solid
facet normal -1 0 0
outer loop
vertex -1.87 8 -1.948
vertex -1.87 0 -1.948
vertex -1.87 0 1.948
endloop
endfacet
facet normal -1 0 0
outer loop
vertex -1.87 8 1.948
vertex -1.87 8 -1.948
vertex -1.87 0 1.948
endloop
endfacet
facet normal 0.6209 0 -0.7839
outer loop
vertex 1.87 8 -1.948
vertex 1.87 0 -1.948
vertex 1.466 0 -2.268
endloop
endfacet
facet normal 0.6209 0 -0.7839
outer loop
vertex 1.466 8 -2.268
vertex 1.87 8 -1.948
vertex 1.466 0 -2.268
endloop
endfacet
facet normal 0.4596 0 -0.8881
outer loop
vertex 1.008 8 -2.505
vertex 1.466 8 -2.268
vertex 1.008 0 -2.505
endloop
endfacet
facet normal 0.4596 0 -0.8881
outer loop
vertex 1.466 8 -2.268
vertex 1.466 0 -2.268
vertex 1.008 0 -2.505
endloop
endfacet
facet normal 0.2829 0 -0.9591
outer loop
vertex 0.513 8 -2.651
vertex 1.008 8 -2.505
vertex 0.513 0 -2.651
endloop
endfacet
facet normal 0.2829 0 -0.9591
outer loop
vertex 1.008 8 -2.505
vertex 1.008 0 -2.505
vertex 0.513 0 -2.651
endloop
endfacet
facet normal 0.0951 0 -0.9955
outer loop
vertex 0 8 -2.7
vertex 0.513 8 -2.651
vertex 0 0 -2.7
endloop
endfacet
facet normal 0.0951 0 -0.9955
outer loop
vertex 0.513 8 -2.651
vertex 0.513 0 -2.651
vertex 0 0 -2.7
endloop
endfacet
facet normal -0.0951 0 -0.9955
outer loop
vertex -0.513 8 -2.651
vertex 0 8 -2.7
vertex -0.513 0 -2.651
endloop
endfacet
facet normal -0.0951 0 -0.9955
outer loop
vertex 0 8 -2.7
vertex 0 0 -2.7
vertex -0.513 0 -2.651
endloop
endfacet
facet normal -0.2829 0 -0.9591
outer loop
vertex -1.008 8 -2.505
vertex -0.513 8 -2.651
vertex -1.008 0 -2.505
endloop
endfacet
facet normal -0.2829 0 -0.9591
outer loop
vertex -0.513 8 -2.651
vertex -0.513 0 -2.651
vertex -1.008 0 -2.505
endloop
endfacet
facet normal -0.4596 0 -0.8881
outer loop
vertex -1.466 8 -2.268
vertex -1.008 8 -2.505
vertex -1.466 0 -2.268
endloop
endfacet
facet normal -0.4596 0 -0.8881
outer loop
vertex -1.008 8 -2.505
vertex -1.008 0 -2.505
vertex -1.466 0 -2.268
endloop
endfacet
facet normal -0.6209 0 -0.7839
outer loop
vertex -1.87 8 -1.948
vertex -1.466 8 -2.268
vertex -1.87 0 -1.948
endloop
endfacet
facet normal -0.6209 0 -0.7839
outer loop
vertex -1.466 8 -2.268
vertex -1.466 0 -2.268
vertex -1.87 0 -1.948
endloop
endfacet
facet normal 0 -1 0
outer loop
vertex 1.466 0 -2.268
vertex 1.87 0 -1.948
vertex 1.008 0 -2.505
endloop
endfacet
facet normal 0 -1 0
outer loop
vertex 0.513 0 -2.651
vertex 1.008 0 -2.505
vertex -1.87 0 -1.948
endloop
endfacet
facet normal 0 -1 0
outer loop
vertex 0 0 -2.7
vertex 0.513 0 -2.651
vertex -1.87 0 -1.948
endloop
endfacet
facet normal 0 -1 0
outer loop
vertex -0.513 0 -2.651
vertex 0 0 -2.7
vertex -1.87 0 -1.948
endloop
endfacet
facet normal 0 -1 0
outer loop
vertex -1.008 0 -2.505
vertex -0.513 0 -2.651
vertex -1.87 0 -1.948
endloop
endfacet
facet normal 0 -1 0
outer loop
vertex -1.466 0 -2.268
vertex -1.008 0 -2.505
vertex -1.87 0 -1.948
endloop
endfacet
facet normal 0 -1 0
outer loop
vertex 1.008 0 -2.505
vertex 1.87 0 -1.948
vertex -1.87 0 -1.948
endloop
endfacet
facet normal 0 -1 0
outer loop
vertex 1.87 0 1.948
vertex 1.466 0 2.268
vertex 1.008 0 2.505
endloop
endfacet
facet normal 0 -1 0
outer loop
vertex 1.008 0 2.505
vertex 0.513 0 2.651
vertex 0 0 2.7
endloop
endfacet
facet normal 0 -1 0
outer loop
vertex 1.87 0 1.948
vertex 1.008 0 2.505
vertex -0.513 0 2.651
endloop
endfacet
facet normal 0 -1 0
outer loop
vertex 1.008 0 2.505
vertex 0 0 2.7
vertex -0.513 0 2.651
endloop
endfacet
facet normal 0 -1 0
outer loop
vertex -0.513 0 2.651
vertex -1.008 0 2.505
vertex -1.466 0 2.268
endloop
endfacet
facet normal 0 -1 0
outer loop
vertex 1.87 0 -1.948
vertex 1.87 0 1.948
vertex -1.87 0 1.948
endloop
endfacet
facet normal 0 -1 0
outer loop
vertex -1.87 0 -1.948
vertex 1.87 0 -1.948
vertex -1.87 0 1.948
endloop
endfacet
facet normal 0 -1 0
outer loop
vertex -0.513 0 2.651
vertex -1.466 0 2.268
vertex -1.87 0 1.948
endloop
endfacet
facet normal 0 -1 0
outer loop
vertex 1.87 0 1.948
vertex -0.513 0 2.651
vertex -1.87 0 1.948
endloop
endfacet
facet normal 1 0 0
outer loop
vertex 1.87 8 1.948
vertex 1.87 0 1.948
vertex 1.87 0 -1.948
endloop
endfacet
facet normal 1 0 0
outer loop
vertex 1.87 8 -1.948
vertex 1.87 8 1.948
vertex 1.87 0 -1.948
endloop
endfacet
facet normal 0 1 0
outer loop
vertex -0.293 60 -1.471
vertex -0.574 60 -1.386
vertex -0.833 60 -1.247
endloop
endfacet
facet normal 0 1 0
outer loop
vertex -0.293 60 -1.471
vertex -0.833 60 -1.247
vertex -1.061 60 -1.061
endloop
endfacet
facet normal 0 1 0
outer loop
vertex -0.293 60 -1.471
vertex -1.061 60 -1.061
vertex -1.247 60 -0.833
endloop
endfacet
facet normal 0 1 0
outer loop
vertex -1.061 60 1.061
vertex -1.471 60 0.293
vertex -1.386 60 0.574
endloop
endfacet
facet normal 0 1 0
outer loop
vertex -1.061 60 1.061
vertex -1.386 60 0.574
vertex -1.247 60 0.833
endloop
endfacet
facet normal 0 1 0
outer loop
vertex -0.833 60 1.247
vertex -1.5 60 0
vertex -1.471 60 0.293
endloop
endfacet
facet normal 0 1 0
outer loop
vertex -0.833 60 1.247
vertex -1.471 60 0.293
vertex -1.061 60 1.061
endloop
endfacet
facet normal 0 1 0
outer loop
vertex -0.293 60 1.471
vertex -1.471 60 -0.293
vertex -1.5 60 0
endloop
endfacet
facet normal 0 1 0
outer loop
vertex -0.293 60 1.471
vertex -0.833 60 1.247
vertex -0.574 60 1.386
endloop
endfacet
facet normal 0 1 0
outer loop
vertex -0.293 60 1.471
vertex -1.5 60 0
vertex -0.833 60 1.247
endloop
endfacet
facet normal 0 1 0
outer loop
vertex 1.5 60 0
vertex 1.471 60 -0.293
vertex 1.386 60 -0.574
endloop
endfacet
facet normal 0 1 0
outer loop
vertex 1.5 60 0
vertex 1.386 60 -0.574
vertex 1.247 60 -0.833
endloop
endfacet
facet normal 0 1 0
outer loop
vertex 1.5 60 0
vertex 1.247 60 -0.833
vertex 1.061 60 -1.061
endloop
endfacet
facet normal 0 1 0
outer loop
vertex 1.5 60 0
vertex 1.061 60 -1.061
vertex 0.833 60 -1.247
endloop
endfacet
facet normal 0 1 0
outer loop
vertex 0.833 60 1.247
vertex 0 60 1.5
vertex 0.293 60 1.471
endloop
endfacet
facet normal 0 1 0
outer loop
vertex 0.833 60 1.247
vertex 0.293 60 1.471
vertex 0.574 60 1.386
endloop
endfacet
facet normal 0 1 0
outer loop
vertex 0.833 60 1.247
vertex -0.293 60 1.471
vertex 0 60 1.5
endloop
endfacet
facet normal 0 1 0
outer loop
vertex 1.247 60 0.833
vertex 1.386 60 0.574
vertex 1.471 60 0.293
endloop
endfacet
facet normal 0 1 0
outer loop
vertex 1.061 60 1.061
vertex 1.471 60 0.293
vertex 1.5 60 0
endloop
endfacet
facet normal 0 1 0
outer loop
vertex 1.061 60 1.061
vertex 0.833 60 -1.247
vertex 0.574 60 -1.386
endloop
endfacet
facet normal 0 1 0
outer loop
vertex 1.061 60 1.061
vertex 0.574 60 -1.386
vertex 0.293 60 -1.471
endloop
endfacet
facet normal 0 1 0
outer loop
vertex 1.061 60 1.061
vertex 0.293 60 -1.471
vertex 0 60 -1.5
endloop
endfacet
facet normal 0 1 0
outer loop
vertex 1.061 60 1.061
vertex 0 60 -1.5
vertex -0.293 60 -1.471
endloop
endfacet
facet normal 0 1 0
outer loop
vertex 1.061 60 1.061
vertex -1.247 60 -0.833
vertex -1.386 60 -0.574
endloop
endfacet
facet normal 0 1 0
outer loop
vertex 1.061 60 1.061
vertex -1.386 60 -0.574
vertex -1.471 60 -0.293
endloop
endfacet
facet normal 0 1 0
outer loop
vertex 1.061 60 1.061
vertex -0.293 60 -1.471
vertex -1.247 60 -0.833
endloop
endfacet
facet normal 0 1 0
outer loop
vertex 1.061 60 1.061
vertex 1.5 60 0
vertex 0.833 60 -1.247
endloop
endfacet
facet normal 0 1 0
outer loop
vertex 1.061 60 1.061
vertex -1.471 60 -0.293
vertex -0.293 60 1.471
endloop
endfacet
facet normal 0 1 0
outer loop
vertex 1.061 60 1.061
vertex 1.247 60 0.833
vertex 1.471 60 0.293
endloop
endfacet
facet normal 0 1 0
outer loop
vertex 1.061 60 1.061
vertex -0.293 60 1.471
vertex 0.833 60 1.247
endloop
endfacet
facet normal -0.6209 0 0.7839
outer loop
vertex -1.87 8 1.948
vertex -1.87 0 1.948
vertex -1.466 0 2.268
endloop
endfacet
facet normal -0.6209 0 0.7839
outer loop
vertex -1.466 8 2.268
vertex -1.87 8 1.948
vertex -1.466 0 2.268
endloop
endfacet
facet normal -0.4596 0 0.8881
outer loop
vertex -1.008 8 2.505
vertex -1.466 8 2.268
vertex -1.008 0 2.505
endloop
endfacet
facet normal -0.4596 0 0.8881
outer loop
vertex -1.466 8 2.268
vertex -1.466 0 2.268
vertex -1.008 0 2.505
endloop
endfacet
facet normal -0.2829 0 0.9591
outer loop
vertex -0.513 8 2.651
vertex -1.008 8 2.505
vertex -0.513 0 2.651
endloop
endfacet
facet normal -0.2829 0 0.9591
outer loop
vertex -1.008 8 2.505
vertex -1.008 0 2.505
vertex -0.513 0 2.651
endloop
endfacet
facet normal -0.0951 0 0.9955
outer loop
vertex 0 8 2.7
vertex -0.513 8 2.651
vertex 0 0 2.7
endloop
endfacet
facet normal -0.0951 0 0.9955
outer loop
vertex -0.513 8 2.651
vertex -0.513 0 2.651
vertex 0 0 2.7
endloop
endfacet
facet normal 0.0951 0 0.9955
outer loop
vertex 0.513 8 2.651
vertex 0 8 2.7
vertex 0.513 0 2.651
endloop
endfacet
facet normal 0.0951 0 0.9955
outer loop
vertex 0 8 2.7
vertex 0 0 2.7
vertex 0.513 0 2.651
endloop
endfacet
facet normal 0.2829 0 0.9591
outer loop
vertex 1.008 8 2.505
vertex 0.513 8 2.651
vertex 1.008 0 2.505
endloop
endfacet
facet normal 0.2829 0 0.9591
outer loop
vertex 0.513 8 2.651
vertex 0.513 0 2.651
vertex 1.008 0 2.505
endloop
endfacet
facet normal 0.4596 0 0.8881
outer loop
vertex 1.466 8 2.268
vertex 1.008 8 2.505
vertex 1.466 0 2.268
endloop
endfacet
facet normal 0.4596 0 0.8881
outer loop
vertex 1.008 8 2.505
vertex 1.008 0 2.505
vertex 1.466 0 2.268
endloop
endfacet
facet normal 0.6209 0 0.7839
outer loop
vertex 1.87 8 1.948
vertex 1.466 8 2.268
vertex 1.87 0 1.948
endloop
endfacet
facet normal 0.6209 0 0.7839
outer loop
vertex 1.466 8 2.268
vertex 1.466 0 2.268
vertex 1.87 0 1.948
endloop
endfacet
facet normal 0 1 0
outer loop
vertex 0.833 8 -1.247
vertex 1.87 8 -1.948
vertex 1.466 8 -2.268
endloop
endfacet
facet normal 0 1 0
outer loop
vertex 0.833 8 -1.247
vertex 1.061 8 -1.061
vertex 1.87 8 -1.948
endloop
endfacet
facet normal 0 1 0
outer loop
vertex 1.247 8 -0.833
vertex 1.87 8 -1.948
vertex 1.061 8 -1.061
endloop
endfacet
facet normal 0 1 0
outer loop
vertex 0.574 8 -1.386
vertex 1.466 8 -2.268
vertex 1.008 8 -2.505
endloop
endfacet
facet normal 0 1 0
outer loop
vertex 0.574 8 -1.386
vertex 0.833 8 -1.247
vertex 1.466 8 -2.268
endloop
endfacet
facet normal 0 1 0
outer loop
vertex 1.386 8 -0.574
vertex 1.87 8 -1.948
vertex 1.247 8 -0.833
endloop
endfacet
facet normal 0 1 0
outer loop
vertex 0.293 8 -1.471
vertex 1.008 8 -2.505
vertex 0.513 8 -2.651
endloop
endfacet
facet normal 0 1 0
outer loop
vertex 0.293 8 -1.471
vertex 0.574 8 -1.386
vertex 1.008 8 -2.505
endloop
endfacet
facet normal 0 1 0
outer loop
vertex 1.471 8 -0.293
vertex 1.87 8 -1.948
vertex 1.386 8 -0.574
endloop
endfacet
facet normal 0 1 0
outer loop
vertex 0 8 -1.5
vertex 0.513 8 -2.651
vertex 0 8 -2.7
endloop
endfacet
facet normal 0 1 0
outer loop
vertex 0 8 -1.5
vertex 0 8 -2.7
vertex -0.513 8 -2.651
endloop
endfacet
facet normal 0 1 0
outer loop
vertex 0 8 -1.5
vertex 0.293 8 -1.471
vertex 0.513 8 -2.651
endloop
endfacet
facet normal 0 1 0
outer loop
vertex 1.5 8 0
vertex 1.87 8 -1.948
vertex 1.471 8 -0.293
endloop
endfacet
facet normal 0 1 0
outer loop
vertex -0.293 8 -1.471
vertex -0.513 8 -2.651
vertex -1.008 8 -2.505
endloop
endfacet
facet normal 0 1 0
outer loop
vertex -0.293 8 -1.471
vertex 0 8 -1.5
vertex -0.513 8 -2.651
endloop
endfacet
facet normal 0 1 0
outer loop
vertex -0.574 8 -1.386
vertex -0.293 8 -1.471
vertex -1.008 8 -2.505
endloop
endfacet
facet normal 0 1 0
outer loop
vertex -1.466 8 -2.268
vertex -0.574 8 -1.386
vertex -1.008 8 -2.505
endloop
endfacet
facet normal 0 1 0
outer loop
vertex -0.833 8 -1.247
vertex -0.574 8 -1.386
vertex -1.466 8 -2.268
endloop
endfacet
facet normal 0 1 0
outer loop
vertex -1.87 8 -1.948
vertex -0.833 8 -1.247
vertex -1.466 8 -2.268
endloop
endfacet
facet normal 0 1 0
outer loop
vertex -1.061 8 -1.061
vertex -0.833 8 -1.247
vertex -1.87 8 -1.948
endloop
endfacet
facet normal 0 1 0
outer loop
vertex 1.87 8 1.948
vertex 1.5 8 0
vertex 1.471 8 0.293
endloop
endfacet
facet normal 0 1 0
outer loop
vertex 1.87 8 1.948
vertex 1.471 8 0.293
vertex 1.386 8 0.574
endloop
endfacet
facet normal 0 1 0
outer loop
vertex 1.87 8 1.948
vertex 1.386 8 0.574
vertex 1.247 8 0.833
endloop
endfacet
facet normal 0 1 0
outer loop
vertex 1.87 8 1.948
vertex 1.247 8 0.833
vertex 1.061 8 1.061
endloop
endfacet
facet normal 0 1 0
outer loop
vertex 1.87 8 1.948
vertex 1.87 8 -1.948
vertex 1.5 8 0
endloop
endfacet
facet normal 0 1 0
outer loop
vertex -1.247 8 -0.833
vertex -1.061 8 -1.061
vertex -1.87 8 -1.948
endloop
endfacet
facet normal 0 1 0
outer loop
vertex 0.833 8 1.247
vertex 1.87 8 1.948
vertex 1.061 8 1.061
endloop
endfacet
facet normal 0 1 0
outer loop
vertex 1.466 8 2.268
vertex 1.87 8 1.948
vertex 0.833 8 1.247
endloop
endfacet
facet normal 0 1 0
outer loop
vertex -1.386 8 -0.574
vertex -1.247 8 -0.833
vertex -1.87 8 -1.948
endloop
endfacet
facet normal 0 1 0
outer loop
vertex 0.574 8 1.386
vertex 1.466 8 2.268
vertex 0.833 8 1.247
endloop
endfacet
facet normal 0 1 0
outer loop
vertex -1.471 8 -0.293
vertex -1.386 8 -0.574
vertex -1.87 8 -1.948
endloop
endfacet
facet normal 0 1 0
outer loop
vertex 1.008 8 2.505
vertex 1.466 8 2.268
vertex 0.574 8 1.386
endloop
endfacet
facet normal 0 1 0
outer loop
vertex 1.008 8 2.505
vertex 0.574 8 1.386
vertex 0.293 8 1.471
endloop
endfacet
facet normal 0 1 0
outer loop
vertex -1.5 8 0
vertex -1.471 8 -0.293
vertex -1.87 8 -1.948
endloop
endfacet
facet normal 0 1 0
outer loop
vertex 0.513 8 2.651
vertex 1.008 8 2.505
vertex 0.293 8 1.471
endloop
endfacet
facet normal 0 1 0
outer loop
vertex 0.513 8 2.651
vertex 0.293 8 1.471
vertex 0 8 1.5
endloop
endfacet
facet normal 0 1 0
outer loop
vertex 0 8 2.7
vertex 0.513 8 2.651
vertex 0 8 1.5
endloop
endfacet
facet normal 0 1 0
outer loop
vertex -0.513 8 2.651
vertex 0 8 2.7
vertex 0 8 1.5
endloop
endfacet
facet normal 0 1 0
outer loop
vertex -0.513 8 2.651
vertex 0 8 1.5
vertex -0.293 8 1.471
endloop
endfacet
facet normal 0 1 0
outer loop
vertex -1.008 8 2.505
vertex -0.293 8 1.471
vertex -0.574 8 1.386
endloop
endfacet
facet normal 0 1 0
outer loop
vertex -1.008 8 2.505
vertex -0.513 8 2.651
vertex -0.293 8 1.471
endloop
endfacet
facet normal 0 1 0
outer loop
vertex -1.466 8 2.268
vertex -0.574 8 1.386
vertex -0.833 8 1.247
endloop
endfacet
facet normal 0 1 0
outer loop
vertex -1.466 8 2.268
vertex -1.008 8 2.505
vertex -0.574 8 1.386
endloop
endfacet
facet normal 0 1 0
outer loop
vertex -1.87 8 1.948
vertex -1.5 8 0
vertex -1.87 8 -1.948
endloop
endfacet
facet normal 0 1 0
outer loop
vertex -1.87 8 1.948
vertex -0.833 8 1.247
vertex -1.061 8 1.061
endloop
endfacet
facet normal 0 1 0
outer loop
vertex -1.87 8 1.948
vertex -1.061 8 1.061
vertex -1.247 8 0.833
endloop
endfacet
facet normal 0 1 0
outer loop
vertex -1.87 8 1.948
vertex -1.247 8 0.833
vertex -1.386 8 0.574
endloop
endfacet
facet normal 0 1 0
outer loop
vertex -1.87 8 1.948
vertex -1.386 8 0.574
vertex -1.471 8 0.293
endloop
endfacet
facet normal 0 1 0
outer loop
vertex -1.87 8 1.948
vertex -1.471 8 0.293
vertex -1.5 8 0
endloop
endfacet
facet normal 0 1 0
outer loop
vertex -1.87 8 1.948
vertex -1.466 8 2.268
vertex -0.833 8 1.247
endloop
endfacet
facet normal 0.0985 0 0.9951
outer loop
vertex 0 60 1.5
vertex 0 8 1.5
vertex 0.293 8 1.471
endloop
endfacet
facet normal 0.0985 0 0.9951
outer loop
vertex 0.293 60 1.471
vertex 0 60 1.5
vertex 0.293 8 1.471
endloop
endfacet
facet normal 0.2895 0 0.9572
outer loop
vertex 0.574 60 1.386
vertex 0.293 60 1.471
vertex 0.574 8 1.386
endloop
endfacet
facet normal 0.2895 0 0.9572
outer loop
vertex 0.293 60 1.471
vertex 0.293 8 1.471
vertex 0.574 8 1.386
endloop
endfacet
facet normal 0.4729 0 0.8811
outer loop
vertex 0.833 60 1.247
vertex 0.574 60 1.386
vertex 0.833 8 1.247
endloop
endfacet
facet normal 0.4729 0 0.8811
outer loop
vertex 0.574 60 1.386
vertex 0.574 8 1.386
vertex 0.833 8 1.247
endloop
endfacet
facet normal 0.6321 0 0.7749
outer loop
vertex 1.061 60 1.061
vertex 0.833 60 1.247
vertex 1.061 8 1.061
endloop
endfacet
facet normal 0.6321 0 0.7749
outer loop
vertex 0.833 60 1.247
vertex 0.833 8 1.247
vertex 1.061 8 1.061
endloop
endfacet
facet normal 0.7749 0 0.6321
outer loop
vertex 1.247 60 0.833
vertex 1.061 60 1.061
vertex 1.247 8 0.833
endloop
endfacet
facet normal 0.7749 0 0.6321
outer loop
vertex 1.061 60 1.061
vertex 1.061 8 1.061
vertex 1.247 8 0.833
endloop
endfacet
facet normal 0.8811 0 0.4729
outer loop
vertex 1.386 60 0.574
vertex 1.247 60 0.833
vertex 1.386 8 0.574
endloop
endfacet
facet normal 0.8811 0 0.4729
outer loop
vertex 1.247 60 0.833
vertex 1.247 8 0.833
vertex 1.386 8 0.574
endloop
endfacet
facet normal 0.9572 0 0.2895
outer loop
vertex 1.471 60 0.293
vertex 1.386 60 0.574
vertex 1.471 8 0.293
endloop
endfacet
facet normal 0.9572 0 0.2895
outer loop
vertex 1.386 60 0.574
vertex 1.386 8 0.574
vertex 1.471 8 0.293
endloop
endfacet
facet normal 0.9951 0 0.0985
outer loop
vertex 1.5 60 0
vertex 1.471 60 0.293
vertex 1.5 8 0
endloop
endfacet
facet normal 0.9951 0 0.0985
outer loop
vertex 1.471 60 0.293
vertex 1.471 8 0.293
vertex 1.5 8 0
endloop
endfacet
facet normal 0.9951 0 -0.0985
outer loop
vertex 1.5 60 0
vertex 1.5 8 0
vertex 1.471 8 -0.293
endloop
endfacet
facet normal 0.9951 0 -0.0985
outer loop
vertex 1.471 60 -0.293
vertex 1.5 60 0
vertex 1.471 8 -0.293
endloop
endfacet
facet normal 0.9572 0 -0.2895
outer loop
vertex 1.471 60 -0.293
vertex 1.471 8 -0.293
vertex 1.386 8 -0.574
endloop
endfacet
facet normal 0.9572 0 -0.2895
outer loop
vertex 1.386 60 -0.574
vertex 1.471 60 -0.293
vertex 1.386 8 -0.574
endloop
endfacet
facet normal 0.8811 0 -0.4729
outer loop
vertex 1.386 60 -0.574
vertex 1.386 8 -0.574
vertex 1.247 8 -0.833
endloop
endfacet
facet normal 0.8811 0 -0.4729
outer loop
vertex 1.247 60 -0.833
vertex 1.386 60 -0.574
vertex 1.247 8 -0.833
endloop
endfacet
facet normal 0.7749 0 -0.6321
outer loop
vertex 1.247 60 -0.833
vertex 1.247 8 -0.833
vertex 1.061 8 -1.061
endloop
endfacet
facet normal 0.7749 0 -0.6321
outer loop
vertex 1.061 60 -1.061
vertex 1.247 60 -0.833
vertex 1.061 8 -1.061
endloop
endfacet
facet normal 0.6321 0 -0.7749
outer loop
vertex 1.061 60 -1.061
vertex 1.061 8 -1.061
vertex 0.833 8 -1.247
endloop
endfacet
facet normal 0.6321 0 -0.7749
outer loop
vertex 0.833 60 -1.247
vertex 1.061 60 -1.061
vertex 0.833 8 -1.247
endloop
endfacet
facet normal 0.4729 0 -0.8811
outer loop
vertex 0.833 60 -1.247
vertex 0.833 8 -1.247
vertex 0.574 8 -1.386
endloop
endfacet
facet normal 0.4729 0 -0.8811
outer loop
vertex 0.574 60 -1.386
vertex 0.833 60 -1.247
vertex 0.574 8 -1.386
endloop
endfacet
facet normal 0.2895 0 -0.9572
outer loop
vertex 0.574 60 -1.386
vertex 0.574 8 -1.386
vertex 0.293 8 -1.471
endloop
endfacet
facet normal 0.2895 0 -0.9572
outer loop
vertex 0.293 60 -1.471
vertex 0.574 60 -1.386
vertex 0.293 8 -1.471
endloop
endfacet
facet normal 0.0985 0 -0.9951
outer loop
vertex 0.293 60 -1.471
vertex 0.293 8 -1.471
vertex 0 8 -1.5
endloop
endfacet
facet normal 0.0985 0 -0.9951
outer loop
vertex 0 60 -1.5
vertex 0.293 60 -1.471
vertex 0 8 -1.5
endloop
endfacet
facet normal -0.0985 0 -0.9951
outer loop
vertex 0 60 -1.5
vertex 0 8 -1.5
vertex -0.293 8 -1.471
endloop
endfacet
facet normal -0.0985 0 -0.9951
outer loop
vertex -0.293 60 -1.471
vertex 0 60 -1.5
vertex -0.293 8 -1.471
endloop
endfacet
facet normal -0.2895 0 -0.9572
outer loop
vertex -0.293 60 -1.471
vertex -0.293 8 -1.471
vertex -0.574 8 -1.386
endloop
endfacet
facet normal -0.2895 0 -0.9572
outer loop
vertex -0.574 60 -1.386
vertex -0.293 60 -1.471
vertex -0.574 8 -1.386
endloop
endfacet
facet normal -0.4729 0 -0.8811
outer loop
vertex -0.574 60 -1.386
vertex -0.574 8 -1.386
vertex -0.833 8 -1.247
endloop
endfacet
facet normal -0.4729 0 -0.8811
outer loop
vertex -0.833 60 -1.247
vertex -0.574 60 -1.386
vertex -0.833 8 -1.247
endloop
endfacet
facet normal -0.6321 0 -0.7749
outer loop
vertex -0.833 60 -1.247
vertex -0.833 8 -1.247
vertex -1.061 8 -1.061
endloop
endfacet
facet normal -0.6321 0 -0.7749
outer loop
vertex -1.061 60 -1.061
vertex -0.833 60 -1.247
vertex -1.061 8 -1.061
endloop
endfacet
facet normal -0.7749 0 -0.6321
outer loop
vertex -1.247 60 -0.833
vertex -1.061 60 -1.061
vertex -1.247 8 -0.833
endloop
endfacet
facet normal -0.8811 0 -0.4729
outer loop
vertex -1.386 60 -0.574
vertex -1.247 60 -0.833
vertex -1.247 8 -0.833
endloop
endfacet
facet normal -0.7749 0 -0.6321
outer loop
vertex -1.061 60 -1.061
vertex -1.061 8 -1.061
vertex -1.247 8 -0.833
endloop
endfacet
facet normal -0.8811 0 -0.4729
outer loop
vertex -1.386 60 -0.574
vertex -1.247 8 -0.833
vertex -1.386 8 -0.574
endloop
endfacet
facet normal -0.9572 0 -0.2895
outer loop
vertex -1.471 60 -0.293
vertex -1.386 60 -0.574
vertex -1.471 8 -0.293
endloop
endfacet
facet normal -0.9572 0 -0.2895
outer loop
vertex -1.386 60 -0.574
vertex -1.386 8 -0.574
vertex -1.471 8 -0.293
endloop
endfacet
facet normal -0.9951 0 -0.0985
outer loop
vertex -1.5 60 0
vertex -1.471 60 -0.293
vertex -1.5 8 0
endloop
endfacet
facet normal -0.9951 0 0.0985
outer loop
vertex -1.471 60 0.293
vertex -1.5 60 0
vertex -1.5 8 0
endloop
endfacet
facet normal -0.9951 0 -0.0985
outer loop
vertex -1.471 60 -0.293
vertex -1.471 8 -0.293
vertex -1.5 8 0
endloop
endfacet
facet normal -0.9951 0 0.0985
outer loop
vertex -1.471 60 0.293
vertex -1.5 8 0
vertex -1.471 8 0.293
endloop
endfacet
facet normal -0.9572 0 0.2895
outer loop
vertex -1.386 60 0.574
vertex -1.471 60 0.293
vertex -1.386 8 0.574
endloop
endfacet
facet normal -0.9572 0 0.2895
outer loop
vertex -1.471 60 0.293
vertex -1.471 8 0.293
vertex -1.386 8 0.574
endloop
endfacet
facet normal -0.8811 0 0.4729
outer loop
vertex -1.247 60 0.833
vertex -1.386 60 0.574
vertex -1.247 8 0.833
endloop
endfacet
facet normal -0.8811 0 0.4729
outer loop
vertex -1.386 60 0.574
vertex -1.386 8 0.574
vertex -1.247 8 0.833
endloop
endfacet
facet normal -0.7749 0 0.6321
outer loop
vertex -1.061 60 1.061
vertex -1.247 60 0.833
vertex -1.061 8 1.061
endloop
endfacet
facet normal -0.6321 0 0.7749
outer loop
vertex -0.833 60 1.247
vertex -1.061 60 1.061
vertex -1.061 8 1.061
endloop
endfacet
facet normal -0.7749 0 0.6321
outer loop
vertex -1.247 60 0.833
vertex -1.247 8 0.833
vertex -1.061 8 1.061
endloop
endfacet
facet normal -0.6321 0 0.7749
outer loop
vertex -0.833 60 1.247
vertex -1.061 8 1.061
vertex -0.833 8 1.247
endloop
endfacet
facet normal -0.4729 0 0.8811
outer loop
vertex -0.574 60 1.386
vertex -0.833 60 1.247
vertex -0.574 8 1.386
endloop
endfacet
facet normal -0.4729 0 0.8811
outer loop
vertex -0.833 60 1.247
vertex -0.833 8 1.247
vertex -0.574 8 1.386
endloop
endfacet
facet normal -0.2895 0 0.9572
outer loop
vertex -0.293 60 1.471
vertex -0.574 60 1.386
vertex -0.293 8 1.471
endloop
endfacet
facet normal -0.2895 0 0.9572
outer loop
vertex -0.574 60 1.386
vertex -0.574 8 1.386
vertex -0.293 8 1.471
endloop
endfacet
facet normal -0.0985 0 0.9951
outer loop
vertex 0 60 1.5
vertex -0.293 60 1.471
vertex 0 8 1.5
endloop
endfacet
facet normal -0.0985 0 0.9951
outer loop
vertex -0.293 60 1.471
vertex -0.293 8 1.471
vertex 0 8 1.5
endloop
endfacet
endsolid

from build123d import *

# Parameters (mm, degrees)
SKETCH_1_R      = 1.5
EXTRUDE_1_DEPTH = 60
EXTRUDE_2_DEPTH = 8


with BuildPart() as part:
    # 草图1 → 凸台-拉伸1 (new body)
    with BuildSketch(Plane(origin=(0, 0, 0), x_dir=(1, 0, 0), z_dir=(0, 1, 0))):
        with Locations(Location((0, 0, 0), (0, 0, 270))):
            Circle(SKETCH_1_R)
    extrude(amount=EXTRUDE_1_DEPTH)

    # 草图2 → 凸台-拉伸2 (add)
    with BuildSketch(Plane.XZ):
        with BuildLine():
            Line((-1.87, -1.947588252), (-1.87, 1.947588252))
            ThreePointArc((-1.87, 1.947588252), (0, 2.7), (1.87, 1.947588252))
            Line((1.87, 1.947588252), (1.87, -1.947588252))
            ThreePointArc((1.87, -1.947588252), (0, -2.7), (-1.87, -1.947588252))
        make_face()
    extrude(amount=-EXTRUDE_2_DEPTH)


solid = part.part
